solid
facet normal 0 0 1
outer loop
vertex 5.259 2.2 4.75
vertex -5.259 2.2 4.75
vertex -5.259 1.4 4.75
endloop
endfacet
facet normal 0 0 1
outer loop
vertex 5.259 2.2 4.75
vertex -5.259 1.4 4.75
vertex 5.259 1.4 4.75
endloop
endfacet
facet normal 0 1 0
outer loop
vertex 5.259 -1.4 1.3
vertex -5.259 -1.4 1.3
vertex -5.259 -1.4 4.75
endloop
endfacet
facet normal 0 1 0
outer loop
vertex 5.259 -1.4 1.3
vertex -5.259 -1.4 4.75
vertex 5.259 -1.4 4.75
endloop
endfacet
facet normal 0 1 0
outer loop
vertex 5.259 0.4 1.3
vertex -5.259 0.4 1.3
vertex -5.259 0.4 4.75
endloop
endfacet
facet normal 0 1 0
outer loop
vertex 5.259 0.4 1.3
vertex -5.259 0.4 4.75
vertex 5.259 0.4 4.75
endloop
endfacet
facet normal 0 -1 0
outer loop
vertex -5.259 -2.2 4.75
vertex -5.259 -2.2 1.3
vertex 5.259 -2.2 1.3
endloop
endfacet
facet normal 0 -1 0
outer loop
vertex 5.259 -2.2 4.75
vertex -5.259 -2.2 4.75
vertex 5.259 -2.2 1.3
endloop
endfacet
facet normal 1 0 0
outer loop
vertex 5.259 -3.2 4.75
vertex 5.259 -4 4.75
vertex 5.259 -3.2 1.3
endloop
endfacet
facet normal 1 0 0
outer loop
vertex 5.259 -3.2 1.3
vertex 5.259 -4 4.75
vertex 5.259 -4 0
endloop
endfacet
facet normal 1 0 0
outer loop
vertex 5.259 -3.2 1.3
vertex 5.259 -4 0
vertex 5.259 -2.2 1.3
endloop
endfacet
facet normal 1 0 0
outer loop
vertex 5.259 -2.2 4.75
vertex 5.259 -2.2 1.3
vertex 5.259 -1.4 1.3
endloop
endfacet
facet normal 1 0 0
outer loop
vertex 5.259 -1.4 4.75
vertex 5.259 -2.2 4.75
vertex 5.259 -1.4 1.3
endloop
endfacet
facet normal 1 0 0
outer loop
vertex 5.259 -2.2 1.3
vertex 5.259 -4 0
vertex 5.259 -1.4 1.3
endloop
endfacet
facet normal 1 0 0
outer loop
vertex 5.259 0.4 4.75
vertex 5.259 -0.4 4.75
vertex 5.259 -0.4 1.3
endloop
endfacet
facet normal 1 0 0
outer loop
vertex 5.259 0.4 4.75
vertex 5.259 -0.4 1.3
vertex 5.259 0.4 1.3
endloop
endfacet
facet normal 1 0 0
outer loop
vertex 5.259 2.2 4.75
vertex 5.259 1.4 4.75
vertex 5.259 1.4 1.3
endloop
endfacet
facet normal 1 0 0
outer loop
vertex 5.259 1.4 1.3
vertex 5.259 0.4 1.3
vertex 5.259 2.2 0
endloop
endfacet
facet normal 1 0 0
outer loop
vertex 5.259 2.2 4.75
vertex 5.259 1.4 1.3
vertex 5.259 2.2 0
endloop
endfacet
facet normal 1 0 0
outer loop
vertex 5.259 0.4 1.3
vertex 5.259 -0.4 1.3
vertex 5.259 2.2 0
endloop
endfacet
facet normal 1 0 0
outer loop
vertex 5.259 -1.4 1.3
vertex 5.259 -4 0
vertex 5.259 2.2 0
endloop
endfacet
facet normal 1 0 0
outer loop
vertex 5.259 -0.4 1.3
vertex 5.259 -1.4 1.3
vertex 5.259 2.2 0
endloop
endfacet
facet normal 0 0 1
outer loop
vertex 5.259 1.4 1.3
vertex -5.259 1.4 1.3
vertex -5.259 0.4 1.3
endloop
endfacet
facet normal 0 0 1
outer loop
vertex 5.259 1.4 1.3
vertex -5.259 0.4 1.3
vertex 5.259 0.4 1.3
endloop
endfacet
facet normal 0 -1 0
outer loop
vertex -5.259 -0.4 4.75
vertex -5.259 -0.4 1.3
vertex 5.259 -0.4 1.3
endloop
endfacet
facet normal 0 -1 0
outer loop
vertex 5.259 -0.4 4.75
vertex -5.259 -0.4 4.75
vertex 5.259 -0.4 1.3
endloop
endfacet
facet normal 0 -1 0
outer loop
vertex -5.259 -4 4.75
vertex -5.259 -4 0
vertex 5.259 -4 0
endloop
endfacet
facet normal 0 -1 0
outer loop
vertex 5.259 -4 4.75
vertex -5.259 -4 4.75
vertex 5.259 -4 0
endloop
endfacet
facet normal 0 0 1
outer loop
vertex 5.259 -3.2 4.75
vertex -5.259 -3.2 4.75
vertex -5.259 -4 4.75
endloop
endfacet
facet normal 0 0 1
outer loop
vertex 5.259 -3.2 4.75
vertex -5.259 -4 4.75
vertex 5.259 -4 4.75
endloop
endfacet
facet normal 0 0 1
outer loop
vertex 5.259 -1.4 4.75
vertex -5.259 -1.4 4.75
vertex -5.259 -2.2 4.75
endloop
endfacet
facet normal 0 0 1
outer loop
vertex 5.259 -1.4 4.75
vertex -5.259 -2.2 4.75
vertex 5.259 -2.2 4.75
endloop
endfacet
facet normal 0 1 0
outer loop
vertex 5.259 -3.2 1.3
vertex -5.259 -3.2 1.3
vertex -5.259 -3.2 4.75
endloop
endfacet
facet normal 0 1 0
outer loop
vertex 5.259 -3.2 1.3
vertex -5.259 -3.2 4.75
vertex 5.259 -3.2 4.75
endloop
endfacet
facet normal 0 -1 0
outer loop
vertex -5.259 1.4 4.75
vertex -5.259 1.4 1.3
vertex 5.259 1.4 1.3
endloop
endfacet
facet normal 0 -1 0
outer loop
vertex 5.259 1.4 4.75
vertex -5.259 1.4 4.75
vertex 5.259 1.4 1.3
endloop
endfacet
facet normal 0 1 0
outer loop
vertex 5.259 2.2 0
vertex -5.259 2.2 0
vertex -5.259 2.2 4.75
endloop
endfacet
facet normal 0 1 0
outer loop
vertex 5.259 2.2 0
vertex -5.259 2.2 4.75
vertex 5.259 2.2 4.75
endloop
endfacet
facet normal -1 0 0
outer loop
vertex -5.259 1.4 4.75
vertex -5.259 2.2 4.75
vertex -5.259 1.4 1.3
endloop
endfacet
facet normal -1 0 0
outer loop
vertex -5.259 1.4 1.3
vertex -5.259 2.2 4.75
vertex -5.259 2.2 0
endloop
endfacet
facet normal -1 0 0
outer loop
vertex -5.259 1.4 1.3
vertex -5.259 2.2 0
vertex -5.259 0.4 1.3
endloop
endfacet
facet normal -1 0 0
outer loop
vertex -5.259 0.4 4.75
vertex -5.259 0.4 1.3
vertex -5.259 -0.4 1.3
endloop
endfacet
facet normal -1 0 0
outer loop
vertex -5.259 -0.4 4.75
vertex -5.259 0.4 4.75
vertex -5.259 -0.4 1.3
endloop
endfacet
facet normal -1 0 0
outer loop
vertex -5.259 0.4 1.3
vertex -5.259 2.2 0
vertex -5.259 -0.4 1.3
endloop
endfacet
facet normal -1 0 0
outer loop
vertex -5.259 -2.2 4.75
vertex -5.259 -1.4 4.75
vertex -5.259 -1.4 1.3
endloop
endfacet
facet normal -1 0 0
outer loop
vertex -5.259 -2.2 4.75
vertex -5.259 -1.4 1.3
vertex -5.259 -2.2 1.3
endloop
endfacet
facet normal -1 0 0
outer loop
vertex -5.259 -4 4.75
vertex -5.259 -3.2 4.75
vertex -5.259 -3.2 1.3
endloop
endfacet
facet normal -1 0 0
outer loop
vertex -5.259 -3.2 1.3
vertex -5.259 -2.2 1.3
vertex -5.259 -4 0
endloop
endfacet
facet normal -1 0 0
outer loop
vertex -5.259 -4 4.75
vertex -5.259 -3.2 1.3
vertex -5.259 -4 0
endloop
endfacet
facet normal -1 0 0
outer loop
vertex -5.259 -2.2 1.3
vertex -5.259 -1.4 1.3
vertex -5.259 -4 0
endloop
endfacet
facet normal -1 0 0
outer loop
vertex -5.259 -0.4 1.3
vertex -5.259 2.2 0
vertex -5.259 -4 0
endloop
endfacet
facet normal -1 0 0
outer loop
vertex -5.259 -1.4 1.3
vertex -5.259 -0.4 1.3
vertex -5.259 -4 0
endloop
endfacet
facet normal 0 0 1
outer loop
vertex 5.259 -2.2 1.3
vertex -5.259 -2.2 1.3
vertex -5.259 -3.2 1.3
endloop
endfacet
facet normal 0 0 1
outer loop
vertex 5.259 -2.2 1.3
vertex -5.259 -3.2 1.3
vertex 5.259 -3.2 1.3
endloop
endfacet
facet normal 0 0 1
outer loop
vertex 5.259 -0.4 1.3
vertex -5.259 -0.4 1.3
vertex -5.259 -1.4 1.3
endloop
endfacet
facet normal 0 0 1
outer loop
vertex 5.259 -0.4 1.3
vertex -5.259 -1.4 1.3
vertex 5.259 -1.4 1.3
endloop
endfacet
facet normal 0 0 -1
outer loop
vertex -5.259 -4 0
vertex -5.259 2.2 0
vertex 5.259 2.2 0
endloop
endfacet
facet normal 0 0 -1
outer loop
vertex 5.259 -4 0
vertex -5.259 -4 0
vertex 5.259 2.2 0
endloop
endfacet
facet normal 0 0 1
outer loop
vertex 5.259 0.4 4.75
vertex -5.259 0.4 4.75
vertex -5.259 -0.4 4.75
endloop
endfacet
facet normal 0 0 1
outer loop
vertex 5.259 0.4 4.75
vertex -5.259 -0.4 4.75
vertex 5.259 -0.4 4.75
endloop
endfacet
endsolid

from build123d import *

# Parameters (mm, degrees)
F0_W     = 10.518072
F0_H     = 0.8
F0_H_2   = 1
F1_DEPTH = 1.3
F2_DEPTH = 4.75


with BuildPart() as f1:
    # F0 (on Top) → F1 (new body)
    with BuildSketch(Plane.XY):
        with Locations((0, 1.8)):
            Rectangle(F0_W, F0_H)
        with Locations((0, 0.9)):
            Rectangle(F0_W, F0_H_2)
        Rectangle(F0_W, F0_H)
        with Locations((0, -0.9)):
            Rectangle(F0_W, F0_H_2)
        with Locations((0, -1.8)):
            Rectangle(F0_W, F0_H)
        with Locations((0, -2.7)):
            Rectangle(F0_W, F0_H_2)
        with Locations((0, -3.6)):
            Rectangle(F0_W, F0_H)
    extrude(amount=F1_DEPTH)

    # F0 (on Top) → F2 (join)
    with BuildSketch(Plane.XY):
        with Locations((0, 1.8)):
            Rectangle(F0_W, F0_H)
        Rectangle(F0_W, F0_H)
        with Locations((0, -1.8)):
            Rectangle(F0_W, F0_H)
        with Locations((0, -3.6)):
            Rectangle(F0_W, F0_H)
    extrude(amount=F2_DEPTH)


solid = f1.part
